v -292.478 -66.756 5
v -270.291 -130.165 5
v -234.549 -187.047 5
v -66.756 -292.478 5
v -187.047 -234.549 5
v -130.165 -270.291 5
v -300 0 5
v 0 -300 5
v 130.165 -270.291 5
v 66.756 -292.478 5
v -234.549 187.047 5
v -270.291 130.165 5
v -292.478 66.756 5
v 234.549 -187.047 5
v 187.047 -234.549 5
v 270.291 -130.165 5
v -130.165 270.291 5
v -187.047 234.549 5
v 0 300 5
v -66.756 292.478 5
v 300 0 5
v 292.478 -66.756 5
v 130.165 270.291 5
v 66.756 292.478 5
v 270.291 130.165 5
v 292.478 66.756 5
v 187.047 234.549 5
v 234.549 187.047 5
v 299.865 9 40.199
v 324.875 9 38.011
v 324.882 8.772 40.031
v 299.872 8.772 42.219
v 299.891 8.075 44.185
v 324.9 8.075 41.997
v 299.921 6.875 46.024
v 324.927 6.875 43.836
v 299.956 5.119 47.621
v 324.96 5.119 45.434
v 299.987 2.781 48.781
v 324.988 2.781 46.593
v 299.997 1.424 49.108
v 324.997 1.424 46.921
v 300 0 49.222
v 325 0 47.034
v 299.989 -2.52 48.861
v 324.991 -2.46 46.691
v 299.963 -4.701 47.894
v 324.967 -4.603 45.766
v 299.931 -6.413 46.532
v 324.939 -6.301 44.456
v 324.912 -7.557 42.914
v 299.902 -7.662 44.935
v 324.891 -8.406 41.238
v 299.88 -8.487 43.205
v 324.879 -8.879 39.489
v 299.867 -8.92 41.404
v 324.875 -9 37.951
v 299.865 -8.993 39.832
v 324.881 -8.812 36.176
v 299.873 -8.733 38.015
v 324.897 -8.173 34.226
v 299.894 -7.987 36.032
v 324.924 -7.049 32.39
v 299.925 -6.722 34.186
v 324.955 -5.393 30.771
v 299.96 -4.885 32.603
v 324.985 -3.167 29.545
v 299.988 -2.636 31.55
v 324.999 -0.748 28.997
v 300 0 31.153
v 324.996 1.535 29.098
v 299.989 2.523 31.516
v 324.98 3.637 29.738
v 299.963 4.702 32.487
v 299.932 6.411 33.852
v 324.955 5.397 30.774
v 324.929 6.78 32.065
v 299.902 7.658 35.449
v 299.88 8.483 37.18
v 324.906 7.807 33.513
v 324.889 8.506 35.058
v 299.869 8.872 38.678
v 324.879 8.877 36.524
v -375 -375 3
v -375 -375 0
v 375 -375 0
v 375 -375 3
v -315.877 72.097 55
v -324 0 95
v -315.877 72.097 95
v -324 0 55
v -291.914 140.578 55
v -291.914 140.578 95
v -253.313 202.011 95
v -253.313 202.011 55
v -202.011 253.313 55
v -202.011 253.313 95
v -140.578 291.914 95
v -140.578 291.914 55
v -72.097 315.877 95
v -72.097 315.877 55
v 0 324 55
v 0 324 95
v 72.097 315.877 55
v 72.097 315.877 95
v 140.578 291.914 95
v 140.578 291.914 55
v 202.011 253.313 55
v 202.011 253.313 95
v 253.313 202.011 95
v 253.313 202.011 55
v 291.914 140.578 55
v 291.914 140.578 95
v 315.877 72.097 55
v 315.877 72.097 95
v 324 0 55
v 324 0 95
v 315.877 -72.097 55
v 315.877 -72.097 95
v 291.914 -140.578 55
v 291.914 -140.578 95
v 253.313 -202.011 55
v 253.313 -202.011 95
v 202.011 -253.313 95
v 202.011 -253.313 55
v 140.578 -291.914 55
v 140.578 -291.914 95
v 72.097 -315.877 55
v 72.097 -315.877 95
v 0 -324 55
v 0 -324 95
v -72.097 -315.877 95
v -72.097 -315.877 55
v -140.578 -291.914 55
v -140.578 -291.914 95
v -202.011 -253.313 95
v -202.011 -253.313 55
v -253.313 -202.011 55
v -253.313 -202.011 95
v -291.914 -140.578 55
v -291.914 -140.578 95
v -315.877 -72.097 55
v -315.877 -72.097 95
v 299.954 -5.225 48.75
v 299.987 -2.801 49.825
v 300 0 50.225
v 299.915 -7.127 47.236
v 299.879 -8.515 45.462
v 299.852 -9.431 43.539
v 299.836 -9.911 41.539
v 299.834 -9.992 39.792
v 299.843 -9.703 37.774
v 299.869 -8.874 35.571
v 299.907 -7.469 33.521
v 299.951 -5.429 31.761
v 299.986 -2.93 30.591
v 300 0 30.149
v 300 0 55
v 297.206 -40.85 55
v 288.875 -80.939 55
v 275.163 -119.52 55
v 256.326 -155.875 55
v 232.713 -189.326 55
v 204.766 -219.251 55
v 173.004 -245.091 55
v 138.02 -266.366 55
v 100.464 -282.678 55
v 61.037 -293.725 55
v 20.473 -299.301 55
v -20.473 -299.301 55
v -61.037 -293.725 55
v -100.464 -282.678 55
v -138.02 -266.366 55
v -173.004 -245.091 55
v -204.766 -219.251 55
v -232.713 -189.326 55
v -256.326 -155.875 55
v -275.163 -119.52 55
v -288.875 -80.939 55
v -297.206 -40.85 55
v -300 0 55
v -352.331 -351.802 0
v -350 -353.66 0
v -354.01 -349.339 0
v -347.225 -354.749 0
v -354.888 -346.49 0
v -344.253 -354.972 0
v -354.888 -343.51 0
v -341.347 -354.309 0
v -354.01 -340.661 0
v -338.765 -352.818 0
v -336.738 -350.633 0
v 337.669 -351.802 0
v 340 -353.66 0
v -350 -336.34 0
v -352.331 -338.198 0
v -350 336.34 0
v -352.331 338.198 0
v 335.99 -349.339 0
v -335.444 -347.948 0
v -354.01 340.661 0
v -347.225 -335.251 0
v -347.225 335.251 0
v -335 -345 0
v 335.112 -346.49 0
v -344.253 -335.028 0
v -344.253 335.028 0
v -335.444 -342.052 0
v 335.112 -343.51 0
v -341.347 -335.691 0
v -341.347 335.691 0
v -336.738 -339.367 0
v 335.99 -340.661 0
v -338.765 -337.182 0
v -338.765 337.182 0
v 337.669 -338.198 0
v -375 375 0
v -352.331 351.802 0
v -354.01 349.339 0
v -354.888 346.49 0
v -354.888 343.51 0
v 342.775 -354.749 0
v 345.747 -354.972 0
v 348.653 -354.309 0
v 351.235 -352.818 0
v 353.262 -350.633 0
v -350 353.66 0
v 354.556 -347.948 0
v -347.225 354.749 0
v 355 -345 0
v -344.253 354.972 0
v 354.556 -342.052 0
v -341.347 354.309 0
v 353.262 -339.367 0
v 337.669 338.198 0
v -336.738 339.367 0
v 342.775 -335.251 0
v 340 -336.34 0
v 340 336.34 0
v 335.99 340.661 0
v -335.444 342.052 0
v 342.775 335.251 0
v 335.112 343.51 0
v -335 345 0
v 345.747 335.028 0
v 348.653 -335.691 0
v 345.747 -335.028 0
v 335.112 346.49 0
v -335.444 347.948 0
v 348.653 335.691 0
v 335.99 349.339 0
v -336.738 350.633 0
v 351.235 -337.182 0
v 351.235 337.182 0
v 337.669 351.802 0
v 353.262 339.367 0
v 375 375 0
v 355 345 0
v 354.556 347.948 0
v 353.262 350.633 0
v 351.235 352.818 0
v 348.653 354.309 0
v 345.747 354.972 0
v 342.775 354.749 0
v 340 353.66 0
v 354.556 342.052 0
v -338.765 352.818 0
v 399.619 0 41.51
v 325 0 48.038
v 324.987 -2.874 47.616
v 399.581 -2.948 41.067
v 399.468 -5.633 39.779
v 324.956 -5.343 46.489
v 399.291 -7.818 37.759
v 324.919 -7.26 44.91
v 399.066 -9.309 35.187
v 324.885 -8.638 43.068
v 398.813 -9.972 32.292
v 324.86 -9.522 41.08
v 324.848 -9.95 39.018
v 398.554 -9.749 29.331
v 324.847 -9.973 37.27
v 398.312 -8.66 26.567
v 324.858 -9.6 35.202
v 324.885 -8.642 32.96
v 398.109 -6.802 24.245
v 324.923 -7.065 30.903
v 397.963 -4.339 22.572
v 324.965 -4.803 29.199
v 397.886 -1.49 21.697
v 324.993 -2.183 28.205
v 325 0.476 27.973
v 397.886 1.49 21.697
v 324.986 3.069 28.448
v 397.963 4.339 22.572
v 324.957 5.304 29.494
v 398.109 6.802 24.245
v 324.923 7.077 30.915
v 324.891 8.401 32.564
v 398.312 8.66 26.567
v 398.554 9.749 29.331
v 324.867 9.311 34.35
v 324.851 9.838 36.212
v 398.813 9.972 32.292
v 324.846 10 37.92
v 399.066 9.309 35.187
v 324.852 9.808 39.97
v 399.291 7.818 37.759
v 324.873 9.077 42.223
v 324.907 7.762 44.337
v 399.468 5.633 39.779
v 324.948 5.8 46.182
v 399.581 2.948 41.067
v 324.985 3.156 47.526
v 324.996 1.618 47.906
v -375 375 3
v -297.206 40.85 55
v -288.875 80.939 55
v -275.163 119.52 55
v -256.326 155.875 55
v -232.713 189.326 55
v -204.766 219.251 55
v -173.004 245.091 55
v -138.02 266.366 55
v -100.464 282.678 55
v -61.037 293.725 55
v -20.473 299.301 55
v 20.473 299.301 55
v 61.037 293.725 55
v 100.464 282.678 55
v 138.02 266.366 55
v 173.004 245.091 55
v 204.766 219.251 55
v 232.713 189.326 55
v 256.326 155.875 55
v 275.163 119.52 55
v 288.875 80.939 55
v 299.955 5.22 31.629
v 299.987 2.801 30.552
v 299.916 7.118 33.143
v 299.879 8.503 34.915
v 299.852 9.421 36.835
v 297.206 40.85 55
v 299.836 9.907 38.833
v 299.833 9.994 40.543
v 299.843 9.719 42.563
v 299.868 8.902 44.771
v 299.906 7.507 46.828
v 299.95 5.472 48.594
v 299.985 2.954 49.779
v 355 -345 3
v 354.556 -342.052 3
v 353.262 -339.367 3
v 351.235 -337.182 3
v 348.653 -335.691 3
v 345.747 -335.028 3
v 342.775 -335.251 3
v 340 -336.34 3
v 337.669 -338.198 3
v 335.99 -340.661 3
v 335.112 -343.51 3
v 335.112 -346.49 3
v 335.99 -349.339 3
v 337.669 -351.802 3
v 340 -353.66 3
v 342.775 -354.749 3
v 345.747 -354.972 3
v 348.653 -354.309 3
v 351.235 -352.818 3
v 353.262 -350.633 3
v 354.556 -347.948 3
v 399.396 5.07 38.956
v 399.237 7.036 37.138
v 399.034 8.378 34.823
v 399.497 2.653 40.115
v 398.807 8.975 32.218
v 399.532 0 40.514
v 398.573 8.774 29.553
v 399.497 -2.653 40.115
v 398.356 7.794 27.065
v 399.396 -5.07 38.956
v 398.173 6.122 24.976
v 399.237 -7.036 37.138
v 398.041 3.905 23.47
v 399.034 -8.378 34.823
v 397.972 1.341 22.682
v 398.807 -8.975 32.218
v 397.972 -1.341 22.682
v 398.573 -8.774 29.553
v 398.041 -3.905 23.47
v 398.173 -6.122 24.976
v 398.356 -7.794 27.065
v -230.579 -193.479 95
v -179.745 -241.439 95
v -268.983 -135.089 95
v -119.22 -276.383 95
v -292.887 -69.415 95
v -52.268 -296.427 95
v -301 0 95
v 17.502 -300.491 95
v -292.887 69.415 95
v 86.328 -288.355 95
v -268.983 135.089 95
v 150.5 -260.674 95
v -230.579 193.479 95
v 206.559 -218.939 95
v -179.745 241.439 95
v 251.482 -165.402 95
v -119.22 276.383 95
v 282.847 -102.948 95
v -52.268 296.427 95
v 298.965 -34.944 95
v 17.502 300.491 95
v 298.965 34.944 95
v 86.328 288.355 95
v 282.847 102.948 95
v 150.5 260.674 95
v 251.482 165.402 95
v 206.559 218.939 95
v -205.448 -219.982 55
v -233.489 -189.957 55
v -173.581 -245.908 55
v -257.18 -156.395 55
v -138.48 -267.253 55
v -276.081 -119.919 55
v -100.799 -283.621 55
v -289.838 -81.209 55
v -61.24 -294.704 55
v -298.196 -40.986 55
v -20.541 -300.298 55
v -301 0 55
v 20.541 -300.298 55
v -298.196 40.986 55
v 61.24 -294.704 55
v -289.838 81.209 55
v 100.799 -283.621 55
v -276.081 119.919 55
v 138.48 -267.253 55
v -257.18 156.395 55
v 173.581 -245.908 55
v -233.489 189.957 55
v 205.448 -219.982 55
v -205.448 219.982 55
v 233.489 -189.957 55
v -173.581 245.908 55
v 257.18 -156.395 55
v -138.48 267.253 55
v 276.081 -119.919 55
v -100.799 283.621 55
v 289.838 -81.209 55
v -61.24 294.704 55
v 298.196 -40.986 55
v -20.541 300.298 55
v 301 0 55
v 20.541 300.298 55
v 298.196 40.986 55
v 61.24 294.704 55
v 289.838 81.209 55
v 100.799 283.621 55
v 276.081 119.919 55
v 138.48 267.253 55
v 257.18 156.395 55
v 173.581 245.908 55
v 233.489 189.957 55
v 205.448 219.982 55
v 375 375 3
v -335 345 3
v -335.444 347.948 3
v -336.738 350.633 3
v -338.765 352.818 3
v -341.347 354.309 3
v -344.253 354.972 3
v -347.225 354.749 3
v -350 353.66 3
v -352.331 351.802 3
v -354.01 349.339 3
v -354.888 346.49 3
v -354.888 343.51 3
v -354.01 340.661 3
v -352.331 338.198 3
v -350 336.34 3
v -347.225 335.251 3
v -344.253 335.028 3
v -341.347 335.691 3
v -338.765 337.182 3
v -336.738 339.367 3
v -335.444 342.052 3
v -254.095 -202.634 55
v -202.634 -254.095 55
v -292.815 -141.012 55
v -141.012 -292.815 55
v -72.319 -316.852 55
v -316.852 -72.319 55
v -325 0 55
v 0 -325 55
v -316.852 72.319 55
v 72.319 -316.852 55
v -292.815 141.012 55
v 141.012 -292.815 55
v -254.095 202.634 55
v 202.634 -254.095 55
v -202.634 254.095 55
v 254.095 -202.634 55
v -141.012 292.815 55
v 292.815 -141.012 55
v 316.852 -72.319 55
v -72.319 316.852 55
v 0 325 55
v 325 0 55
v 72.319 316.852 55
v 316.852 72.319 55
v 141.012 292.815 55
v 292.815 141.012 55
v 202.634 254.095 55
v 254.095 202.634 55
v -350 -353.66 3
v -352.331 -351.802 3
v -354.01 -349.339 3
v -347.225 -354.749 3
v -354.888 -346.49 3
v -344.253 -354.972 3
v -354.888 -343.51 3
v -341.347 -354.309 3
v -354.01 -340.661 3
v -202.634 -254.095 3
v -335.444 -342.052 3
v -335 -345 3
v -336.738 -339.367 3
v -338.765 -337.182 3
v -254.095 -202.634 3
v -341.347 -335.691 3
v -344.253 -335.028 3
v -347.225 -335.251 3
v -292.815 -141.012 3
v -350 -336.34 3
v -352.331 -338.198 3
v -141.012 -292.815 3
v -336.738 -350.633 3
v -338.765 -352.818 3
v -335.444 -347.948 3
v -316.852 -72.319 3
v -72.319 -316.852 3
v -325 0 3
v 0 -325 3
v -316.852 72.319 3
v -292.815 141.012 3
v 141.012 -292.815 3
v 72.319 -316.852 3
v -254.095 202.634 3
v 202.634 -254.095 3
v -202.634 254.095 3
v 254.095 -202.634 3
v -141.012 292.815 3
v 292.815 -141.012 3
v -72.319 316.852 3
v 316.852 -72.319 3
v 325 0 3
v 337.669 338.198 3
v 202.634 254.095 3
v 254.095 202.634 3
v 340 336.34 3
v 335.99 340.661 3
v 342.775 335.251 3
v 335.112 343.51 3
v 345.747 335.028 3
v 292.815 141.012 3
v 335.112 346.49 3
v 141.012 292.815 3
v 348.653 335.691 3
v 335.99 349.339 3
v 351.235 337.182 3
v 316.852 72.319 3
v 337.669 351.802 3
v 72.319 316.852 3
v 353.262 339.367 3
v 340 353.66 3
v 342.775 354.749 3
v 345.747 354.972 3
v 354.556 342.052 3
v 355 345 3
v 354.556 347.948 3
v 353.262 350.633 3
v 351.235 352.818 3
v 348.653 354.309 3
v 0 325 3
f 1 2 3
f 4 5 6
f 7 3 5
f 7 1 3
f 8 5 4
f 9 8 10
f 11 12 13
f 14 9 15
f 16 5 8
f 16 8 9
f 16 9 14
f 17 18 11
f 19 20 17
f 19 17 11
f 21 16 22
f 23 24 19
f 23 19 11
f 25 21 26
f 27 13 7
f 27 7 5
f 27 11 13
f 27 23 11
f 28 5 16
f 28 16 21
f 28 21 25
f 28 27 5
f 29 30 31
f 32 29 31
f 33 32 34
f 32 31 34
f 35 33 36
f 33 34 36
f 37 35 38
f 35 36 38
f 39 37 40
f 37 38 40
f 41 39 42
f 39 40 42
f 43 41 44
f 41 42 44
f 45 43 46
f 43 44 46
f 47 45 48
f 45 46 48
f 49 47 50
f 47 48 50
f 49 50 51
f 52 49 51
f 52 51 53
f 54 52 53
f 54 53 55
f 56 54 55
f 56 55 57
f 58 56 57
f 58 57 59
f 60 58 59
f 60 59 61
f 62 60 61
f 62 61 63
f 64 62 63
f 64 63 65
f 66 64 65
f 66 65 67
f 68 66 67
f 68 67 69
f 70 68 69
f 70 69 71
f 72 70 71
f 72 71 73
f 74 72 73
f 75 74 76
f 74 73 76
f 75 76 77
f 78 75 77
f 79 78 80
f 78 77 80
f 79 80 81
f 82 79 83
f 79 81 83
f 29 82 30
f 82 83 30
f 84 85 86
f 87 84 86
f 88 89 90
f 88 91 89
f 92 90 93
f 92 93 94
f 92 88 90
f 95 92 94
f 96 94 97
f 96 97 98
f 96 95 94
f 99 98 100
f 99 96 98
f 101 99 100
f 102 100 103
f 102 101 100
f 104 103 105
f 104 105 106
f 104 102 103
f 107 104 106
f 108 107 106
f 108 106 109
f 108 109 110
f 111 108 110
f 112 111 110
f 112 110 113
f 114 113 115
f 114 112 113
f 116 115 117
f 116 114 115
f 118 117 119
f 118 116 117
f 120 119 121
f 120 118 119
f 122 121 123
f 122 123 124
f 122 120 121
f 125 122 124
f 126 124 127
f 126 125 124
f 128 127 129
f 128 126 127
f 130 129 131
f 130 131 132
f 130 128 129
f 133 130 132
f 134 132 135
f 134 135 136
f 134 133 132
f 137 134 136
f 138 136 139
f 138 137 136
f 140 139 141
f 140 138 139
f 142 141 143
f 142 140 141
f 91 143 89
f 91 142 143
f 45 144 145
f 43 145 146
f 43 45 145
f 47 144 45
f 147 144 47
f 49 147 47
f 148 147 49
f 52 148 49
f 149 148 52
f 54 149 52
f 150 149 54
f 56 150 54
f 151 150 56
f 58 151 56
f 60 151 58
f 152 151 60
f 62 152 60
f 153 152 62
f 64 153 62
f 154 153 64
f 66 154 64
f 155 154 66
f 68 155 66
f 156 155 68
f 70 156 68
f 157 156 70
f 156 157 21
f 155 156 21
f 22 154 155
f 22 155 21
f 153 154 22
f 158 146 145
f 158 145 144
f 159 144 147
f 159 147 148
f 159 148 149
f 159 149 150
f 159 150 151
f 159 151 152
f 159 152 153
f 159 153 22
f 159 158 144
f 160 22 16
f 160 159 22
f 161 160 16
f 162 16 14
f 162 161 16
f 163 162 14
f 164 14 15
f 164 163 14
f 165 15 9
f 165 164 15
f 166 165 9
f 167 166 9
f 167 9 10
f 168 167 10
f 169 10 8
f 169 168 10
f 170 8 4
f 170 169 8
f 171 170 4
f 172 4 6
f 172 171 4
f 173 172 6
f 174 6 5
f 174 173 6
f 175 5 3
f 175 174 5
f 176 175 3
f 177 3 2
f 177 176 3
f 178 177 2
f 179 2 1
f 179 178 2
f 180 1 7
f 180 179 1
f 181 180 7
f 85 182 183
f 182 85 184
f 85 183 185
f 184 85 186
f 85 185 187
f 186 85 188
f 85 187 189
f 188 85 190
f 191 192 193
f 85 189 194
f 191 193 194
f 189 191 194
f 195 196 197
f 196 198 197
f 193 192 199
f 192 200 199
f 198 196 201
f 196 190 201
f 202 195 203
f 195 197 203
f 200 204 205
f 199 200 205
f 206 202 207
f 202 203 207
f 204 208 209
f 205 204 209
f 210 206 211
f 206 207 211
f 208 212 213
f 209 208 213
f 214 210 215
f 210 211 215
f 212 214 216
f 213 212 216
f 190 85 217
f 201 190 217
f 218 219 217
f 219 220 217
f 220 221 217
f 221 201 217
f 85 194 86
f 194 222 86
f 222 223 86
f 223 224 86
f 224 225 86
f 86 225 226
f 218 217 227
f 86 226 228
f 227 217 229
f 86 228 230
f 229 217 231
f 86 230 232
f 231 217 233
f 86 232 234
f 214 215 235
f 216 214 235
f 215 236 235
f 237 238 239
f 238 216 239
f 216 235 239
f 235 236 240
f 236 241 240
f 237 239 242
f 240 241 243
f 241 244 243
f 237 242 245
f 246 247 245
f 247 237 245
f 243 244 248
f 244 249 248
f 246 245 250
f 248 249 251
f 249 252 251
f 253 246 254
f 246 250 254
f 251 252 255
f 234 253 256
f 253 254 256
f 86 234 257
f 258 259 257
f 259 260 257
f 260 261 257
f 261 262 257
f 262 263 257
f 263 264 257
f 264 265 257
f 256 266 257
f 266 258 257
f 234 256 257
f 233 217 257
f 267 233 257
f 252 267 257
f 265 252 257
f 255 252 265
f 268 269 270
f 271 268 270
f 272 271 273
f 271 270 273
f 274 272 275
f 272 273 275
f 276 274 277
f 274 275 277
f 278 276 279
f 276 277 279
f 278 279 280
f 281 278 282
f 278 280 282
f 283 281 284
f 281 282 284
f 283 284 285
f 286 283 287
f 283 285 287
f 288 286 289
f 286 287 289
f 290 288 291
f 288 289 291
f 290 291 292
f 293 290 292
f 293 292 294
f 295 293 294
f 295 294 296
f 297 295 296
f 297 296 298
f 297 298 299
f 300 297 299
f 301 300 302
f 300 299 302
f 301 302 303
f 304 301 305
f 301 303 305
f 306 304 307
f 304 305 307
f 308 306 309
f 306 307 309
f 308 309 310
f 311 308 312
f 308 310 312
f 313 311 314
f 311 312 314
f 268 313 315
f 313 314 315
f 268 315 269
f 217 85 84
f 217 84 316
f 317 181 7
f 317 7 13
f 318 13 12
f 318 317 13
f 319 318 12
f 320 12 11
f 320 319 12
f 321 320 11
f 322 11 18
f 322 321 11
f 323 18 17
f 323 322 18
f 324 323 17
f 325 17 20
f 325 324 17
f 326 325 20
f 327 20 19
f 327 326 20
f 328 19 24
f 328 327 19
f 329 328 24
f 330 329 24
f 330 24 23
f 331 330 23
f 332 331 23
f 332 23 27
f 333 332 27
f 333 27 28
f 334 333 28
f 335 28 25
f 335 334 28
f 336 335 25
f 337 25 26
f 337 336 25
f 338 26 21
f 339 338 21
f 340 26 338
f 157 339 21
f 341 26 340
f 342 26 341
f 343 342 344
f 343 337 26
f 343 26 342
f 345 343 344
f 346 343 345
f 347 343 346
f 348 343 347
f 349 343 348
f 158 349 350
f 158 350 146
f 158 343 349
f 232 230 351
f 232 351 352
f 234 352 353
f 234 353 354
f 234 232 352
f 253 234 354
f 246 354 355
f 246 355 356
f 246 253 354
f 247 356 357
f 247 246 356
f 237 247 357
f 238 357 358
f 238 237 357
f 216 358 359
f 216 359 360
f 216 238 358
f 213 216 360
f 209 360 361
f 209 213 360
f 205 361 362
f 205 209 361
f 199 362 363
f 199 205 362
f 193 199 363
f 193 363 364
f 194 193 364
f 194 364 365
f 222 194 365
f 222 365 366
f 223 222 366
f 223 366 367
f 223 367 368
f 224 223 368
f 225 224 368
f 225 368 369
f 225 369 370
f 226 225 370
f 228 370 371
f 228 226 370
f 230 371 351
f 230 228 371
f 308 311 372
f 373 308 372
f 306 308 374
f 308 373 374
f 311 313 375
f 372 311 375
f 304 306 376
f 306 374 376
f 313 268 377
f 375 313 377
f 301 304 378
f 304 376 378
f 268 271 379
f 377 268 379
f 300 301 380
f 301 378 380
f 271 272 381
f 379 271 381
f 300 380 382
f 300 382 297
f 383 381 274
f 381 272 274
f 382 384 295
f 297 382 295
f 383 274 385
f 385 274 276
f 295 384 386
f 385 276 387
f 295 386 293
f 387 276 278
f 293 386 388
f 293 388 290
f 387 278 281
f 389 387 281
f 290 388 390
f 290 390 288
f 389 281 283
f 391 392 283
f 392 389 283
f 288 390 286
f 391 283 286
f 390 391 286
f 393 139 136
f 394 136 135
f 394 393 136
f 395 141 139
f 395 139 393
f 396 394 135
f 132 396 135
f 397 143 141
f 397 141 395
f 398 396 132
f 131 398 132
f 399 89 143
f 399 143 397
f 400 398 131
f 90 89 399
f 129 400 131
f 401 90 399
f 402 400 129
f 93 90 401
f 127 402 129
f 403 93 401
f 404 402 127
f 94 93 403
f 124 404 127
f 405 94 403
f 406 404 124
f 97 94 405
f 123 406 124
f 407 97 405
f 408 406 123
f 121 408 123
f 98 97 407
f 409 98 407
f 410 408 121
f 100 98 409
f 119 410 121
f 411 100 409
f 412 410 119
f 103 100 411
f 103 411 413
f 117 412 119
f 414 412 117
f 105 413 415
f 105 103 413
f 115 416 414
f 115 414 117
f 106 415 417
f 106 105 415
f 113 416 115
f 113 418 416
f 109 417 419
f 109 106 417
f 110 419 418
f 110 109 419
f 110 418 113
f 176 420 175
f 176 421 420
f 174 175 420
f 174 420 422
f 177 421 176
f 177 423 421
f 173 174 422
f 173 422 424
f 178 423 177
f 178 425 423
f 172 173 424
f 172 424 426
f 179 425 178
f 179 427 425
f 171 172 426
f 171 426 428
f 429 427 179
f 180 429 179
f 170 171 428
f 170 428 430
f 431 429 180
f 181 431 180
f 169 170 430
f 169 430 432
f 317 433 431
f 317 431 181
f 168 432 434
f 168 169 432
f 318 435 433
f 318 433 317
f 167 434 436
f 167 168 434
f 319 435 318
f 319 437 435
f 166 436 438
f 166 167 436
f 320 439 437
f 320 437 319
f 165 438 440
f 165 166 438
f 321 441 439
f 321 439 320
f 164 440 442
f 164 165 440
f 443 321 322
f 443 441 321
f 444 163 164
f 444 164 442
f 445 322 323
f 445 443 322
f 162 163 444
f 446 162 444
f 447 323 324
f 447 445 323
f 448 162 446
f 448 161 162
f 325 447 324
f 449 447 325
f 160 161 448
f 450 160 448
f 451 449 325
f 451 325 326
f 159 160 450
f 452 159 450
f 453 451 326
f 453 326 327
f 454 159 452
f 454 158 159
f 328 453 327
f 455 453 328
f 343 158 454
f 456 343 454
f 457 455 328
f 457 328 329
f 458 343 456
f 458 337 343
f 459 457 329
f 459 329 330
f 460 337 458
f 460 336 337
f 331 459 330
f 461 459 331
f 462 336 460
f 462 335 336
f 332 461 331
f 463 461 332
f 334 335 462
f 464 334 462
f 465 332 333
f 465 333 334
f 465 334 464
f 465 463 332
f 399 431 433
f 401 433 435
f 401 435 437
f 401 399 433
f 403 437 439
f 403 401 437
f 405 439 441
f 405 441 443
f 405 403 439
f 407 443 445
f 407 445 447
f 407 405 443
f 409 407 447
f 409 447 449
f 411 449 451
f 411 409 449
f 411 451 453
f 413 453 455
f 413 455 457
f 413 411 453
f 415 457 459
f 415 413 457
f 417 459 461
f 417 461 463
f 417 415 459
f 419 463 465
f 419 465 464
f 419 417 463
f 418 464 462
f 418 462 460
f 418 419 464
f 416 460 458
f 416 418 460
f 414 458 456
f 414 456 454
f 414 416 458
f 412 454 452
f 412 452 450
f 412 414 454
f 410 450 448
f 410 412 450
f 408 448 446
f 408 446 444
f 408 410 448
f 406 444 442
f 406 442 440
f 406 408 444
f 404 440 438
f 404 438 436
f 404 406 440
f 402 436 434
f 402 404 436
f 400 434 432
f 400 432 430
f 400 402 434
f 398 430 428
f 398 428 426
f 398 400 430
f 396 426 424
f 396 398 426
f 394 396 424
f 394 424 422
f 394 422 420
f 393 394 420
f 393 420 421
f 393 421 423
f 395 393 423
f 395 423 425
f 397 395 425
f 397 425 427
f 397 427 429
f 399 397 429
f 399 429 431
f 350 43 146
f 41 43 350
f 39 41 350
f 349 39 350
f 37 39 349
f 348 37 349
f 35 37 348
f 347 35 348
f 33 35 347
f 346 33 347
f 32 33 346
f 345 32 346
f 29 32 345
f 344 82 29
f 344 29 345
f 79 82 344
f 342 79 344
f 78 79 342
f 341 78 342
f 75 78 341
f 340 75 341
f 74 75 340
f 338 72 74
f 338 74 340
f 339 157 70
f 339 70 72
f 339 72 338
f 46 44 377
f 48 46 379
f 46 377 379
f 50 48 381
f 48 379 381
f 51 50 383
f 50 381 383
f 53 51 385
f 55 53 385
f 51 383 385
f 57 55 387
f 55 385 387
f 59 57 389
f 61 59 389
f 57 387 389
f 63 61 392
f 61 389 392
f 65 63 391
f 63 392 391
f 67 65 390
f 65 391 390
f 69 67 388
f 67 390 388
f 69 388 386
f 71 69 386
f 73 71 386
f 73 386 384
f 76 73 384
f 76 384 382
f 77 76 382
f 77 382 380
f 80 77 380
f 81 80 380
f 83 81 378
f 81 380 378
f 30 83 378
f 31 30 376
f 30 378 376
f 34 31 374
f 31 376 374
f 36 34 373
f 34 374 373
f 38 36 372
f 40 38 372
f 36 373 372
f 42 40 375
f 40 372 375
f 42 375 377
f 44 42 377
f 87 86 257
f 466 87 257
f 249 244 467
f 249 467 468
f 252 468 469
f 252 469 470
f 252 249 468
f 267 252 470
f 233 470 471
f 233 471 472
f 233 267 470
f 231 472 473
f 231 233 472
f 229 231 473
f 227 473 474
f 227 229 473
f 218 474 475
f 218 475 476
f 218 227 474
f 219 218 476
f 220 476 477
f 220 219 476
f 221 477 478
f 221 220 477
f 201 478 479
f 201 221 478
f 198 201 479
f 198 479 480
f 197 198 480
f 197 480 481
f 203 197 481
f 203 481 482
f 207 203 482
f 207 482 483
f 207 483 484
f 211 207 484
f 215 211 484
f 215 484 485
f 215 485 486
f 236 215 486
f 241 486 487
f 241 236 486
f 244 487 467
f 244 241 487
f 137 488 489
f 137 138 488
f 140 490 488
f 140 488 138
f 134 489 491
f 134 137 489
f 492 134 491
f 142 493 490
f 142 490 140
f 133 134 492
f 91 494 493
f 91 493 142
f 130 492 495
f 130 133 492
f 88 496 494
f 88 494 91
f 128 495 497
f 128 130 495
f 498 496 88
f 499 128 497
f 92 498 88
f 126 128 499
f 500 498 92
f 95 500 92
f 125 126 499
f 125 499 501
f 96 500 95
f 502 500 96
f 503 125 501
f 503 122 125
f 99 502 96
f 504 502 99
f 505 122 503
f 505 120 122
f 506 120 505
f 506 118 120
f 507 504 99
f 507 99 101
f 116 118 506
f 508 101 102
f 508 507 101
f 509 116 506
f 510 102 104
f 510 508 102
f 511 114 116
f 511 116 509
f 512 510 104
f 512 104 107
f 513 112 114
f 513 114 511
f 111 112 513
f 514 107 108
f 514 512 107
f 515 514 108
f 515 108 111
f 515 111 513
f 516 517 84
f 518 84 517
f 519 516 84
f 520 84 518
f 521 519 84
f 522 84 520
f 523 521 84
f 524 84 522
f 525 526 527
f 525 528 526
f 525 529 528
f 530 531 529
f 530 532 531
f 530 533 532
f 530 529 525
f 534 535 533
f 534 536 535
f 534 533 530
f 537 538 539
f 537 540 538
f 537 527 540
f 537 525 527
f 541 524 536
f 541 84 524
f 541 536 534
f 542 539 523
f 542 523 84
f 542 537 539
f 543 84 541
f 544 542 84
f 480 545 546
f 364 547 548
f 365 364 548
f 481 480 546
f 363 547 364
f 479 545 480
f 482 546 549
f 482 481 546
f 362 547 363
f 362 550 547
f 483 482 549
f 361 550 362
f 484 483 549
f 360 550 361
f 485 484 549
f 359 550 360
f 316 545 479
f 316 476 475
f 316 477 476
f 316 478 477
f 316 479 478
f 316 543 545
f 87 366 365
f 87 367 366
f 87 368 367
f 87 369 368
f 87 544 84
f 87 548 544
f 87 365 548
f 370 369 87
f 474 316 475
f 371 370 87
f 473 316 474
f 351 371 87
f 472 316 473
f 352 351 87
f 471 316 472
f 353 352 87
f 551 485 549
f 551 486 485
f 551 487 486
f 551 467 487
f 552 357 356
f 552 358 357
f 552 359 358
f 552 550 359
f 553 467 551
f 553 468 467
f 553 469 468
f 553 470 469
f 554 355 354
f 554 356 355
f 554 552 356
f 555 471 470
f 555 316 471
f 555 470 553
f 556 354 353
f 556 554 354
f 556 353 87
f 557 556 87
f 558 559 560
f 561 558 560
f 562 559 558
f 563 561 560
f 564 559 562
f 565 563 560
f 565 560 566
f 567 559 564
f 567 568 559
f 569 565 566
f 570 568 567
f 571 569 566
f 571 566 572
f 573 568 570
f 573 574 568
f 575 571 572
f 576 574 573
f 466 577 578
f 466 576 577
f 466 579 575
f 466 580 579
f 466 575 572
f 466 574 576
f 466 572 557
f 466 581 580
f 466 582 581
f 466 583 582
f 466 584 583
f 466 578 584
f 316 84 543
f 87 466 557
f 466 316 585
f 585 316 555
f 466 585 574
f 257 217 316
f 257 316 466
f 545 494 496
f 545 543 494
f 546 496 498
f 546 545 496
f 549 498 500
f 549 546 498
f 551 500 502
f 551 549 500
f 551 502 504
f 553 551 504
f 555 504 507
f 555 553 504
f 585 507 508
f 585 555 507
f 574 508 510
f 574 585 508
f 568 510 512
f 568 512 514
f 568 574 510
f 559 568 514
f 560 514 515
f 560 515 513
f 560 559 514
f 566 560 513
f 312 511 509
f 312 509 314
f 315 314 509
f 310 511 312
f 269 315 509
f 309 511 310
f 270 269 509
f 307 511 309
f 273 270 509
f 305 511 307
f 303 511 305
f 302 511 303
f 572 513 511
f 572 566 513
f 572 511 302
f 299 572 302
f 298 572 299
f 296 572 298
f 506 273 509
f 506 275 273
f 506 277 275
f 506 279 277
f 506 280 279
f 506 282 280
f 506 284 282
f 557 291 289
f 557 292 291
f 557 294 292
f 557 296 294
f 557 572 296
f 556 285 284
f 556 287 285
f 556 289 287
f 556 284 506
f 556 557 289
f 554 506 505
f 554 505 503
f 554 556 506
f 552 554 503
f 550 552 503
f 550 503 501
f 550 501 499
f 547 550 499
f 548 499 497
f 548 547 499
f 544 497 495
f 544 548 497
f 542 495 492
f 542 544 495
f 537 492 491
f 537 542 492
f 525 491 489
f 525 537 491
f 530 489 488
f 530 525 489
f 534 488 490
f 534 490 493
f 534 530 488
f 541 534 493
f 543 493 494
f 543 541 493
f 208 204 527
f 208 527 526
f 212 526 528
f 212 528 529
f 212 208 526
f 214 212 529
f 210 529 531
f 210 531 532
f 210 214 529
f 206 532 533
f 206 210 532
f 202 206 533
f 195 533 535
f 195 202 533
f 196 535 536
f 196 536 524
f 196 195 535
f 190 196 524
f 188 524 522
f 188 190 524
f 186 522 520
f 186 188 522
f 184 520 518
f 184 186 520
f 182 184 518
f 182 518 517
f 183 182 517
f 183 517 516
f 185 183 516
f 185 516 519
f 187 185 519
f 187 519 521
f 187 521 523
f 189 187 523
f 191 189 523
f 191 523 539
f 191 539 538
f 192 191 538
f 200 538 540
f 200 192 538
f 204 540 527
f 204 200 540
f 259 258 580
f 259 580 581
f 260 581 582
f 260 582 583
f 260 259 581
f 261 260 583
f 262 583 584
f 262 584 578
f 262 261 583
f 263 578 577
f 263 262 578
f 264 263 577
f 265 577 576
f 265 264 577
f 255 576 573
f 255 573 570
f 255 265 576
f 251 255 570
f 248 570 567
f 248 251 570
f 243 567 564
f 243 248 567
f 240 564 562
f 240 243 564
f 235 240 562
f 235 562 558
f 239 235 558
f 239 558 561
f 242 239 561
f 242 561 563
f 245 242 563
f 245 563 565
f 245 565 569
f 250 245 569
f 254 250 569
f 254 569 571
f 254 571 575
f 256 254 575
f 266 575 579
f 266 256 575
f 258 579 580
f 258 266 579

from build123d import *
from build123d import SkipClean  # not in build123d's __all__

# Parameters (mm, degrees)
F0_W     = 10
F0_H     = 3
F2_W     = 750
F2_H     = 750
F2_R     = 10
F3_DEPTH = 3
F6_R     = 9
F7_DEPTH = 120
F8_R     = 300
F9_DEPTH = 200


with BuildPart() as f1:
    # F0 (on Front) → F1 (revolve)
    with BuildSketch(Plane.XZ):
        Polygon((-325, 5), (-300, 5), (-300, 55), (-301, 55), (-301, 95), (-324, 95), (-324, 55), (-325, 55), align=None)
        Polygon((-10, 5), (-300, 5), (-325, 5), (-325, 2), (-10, 2), align=None)
        with Locations((-5, 3.5)):
            Rectangle(F0_W, F0_H)
    revolve(axis=Axis((0, 0, 187.9212413023), (0, 0, -1)))

    # F2 (on Top) → F3 (join)
    with BuildSketch(Plane.XY):
        Rectangle(F2_W, F2_H)
        with Locations((-345, -345)):
            Circle(F2_R, mode=Mode.SUBTRACT)
        with Locations((345, -345)):
            Circle(F2_R, mode=Mode.SUBTRACT)
        with Locations((-345, 345)):
            Circle(F2_R, mode=Mode.SUBTRACT)
        with Locations((345, 345)):
            Circle(F2_R, mode=Mode.SUBTRACT)
    extrude(amount=F3_DEPTH)

    # F4 (on Front) → F5 (revolve)
    with BuildSketch(Plane.XZ):
        Polygon((399.6194698092, 41.5098406888), (300, 50.2254149636), (299.9128442573, 49.2292202655), (399.5323140664, 40.5136459907), align=None)
    revolve(axis=Axis((412.7442754949, 0, 30.3233706049), (0.9961946981, 0, -0.0871557427)))

    # F6 (on face) → F7 (cut)
    with BuildSketch(Plane(origin=(392.9798568705, 0, -34.3812824702), x_dir=(0, 1, 0), z_dir=(0.9961946981, 0, -0.0871557427))):
        with Locations((0, 66.1810149205)):
            Circle(F6_R)
    extrude(amount=-F7_DEPTH, mode=Mode.SUBTRACT)

    # F8 (on face) → F9 (cut)
    with BuildSketch(Plane.XY.offset(5)):
        Circle(F8_R)
    with SkipClean():  # cleaning this boolean's faces spoils the solid; the shape is the same uncleaned
        extrude(amount=F9_DEPTH, mode=Mode.SUBTRACT)


solid = f1.part
